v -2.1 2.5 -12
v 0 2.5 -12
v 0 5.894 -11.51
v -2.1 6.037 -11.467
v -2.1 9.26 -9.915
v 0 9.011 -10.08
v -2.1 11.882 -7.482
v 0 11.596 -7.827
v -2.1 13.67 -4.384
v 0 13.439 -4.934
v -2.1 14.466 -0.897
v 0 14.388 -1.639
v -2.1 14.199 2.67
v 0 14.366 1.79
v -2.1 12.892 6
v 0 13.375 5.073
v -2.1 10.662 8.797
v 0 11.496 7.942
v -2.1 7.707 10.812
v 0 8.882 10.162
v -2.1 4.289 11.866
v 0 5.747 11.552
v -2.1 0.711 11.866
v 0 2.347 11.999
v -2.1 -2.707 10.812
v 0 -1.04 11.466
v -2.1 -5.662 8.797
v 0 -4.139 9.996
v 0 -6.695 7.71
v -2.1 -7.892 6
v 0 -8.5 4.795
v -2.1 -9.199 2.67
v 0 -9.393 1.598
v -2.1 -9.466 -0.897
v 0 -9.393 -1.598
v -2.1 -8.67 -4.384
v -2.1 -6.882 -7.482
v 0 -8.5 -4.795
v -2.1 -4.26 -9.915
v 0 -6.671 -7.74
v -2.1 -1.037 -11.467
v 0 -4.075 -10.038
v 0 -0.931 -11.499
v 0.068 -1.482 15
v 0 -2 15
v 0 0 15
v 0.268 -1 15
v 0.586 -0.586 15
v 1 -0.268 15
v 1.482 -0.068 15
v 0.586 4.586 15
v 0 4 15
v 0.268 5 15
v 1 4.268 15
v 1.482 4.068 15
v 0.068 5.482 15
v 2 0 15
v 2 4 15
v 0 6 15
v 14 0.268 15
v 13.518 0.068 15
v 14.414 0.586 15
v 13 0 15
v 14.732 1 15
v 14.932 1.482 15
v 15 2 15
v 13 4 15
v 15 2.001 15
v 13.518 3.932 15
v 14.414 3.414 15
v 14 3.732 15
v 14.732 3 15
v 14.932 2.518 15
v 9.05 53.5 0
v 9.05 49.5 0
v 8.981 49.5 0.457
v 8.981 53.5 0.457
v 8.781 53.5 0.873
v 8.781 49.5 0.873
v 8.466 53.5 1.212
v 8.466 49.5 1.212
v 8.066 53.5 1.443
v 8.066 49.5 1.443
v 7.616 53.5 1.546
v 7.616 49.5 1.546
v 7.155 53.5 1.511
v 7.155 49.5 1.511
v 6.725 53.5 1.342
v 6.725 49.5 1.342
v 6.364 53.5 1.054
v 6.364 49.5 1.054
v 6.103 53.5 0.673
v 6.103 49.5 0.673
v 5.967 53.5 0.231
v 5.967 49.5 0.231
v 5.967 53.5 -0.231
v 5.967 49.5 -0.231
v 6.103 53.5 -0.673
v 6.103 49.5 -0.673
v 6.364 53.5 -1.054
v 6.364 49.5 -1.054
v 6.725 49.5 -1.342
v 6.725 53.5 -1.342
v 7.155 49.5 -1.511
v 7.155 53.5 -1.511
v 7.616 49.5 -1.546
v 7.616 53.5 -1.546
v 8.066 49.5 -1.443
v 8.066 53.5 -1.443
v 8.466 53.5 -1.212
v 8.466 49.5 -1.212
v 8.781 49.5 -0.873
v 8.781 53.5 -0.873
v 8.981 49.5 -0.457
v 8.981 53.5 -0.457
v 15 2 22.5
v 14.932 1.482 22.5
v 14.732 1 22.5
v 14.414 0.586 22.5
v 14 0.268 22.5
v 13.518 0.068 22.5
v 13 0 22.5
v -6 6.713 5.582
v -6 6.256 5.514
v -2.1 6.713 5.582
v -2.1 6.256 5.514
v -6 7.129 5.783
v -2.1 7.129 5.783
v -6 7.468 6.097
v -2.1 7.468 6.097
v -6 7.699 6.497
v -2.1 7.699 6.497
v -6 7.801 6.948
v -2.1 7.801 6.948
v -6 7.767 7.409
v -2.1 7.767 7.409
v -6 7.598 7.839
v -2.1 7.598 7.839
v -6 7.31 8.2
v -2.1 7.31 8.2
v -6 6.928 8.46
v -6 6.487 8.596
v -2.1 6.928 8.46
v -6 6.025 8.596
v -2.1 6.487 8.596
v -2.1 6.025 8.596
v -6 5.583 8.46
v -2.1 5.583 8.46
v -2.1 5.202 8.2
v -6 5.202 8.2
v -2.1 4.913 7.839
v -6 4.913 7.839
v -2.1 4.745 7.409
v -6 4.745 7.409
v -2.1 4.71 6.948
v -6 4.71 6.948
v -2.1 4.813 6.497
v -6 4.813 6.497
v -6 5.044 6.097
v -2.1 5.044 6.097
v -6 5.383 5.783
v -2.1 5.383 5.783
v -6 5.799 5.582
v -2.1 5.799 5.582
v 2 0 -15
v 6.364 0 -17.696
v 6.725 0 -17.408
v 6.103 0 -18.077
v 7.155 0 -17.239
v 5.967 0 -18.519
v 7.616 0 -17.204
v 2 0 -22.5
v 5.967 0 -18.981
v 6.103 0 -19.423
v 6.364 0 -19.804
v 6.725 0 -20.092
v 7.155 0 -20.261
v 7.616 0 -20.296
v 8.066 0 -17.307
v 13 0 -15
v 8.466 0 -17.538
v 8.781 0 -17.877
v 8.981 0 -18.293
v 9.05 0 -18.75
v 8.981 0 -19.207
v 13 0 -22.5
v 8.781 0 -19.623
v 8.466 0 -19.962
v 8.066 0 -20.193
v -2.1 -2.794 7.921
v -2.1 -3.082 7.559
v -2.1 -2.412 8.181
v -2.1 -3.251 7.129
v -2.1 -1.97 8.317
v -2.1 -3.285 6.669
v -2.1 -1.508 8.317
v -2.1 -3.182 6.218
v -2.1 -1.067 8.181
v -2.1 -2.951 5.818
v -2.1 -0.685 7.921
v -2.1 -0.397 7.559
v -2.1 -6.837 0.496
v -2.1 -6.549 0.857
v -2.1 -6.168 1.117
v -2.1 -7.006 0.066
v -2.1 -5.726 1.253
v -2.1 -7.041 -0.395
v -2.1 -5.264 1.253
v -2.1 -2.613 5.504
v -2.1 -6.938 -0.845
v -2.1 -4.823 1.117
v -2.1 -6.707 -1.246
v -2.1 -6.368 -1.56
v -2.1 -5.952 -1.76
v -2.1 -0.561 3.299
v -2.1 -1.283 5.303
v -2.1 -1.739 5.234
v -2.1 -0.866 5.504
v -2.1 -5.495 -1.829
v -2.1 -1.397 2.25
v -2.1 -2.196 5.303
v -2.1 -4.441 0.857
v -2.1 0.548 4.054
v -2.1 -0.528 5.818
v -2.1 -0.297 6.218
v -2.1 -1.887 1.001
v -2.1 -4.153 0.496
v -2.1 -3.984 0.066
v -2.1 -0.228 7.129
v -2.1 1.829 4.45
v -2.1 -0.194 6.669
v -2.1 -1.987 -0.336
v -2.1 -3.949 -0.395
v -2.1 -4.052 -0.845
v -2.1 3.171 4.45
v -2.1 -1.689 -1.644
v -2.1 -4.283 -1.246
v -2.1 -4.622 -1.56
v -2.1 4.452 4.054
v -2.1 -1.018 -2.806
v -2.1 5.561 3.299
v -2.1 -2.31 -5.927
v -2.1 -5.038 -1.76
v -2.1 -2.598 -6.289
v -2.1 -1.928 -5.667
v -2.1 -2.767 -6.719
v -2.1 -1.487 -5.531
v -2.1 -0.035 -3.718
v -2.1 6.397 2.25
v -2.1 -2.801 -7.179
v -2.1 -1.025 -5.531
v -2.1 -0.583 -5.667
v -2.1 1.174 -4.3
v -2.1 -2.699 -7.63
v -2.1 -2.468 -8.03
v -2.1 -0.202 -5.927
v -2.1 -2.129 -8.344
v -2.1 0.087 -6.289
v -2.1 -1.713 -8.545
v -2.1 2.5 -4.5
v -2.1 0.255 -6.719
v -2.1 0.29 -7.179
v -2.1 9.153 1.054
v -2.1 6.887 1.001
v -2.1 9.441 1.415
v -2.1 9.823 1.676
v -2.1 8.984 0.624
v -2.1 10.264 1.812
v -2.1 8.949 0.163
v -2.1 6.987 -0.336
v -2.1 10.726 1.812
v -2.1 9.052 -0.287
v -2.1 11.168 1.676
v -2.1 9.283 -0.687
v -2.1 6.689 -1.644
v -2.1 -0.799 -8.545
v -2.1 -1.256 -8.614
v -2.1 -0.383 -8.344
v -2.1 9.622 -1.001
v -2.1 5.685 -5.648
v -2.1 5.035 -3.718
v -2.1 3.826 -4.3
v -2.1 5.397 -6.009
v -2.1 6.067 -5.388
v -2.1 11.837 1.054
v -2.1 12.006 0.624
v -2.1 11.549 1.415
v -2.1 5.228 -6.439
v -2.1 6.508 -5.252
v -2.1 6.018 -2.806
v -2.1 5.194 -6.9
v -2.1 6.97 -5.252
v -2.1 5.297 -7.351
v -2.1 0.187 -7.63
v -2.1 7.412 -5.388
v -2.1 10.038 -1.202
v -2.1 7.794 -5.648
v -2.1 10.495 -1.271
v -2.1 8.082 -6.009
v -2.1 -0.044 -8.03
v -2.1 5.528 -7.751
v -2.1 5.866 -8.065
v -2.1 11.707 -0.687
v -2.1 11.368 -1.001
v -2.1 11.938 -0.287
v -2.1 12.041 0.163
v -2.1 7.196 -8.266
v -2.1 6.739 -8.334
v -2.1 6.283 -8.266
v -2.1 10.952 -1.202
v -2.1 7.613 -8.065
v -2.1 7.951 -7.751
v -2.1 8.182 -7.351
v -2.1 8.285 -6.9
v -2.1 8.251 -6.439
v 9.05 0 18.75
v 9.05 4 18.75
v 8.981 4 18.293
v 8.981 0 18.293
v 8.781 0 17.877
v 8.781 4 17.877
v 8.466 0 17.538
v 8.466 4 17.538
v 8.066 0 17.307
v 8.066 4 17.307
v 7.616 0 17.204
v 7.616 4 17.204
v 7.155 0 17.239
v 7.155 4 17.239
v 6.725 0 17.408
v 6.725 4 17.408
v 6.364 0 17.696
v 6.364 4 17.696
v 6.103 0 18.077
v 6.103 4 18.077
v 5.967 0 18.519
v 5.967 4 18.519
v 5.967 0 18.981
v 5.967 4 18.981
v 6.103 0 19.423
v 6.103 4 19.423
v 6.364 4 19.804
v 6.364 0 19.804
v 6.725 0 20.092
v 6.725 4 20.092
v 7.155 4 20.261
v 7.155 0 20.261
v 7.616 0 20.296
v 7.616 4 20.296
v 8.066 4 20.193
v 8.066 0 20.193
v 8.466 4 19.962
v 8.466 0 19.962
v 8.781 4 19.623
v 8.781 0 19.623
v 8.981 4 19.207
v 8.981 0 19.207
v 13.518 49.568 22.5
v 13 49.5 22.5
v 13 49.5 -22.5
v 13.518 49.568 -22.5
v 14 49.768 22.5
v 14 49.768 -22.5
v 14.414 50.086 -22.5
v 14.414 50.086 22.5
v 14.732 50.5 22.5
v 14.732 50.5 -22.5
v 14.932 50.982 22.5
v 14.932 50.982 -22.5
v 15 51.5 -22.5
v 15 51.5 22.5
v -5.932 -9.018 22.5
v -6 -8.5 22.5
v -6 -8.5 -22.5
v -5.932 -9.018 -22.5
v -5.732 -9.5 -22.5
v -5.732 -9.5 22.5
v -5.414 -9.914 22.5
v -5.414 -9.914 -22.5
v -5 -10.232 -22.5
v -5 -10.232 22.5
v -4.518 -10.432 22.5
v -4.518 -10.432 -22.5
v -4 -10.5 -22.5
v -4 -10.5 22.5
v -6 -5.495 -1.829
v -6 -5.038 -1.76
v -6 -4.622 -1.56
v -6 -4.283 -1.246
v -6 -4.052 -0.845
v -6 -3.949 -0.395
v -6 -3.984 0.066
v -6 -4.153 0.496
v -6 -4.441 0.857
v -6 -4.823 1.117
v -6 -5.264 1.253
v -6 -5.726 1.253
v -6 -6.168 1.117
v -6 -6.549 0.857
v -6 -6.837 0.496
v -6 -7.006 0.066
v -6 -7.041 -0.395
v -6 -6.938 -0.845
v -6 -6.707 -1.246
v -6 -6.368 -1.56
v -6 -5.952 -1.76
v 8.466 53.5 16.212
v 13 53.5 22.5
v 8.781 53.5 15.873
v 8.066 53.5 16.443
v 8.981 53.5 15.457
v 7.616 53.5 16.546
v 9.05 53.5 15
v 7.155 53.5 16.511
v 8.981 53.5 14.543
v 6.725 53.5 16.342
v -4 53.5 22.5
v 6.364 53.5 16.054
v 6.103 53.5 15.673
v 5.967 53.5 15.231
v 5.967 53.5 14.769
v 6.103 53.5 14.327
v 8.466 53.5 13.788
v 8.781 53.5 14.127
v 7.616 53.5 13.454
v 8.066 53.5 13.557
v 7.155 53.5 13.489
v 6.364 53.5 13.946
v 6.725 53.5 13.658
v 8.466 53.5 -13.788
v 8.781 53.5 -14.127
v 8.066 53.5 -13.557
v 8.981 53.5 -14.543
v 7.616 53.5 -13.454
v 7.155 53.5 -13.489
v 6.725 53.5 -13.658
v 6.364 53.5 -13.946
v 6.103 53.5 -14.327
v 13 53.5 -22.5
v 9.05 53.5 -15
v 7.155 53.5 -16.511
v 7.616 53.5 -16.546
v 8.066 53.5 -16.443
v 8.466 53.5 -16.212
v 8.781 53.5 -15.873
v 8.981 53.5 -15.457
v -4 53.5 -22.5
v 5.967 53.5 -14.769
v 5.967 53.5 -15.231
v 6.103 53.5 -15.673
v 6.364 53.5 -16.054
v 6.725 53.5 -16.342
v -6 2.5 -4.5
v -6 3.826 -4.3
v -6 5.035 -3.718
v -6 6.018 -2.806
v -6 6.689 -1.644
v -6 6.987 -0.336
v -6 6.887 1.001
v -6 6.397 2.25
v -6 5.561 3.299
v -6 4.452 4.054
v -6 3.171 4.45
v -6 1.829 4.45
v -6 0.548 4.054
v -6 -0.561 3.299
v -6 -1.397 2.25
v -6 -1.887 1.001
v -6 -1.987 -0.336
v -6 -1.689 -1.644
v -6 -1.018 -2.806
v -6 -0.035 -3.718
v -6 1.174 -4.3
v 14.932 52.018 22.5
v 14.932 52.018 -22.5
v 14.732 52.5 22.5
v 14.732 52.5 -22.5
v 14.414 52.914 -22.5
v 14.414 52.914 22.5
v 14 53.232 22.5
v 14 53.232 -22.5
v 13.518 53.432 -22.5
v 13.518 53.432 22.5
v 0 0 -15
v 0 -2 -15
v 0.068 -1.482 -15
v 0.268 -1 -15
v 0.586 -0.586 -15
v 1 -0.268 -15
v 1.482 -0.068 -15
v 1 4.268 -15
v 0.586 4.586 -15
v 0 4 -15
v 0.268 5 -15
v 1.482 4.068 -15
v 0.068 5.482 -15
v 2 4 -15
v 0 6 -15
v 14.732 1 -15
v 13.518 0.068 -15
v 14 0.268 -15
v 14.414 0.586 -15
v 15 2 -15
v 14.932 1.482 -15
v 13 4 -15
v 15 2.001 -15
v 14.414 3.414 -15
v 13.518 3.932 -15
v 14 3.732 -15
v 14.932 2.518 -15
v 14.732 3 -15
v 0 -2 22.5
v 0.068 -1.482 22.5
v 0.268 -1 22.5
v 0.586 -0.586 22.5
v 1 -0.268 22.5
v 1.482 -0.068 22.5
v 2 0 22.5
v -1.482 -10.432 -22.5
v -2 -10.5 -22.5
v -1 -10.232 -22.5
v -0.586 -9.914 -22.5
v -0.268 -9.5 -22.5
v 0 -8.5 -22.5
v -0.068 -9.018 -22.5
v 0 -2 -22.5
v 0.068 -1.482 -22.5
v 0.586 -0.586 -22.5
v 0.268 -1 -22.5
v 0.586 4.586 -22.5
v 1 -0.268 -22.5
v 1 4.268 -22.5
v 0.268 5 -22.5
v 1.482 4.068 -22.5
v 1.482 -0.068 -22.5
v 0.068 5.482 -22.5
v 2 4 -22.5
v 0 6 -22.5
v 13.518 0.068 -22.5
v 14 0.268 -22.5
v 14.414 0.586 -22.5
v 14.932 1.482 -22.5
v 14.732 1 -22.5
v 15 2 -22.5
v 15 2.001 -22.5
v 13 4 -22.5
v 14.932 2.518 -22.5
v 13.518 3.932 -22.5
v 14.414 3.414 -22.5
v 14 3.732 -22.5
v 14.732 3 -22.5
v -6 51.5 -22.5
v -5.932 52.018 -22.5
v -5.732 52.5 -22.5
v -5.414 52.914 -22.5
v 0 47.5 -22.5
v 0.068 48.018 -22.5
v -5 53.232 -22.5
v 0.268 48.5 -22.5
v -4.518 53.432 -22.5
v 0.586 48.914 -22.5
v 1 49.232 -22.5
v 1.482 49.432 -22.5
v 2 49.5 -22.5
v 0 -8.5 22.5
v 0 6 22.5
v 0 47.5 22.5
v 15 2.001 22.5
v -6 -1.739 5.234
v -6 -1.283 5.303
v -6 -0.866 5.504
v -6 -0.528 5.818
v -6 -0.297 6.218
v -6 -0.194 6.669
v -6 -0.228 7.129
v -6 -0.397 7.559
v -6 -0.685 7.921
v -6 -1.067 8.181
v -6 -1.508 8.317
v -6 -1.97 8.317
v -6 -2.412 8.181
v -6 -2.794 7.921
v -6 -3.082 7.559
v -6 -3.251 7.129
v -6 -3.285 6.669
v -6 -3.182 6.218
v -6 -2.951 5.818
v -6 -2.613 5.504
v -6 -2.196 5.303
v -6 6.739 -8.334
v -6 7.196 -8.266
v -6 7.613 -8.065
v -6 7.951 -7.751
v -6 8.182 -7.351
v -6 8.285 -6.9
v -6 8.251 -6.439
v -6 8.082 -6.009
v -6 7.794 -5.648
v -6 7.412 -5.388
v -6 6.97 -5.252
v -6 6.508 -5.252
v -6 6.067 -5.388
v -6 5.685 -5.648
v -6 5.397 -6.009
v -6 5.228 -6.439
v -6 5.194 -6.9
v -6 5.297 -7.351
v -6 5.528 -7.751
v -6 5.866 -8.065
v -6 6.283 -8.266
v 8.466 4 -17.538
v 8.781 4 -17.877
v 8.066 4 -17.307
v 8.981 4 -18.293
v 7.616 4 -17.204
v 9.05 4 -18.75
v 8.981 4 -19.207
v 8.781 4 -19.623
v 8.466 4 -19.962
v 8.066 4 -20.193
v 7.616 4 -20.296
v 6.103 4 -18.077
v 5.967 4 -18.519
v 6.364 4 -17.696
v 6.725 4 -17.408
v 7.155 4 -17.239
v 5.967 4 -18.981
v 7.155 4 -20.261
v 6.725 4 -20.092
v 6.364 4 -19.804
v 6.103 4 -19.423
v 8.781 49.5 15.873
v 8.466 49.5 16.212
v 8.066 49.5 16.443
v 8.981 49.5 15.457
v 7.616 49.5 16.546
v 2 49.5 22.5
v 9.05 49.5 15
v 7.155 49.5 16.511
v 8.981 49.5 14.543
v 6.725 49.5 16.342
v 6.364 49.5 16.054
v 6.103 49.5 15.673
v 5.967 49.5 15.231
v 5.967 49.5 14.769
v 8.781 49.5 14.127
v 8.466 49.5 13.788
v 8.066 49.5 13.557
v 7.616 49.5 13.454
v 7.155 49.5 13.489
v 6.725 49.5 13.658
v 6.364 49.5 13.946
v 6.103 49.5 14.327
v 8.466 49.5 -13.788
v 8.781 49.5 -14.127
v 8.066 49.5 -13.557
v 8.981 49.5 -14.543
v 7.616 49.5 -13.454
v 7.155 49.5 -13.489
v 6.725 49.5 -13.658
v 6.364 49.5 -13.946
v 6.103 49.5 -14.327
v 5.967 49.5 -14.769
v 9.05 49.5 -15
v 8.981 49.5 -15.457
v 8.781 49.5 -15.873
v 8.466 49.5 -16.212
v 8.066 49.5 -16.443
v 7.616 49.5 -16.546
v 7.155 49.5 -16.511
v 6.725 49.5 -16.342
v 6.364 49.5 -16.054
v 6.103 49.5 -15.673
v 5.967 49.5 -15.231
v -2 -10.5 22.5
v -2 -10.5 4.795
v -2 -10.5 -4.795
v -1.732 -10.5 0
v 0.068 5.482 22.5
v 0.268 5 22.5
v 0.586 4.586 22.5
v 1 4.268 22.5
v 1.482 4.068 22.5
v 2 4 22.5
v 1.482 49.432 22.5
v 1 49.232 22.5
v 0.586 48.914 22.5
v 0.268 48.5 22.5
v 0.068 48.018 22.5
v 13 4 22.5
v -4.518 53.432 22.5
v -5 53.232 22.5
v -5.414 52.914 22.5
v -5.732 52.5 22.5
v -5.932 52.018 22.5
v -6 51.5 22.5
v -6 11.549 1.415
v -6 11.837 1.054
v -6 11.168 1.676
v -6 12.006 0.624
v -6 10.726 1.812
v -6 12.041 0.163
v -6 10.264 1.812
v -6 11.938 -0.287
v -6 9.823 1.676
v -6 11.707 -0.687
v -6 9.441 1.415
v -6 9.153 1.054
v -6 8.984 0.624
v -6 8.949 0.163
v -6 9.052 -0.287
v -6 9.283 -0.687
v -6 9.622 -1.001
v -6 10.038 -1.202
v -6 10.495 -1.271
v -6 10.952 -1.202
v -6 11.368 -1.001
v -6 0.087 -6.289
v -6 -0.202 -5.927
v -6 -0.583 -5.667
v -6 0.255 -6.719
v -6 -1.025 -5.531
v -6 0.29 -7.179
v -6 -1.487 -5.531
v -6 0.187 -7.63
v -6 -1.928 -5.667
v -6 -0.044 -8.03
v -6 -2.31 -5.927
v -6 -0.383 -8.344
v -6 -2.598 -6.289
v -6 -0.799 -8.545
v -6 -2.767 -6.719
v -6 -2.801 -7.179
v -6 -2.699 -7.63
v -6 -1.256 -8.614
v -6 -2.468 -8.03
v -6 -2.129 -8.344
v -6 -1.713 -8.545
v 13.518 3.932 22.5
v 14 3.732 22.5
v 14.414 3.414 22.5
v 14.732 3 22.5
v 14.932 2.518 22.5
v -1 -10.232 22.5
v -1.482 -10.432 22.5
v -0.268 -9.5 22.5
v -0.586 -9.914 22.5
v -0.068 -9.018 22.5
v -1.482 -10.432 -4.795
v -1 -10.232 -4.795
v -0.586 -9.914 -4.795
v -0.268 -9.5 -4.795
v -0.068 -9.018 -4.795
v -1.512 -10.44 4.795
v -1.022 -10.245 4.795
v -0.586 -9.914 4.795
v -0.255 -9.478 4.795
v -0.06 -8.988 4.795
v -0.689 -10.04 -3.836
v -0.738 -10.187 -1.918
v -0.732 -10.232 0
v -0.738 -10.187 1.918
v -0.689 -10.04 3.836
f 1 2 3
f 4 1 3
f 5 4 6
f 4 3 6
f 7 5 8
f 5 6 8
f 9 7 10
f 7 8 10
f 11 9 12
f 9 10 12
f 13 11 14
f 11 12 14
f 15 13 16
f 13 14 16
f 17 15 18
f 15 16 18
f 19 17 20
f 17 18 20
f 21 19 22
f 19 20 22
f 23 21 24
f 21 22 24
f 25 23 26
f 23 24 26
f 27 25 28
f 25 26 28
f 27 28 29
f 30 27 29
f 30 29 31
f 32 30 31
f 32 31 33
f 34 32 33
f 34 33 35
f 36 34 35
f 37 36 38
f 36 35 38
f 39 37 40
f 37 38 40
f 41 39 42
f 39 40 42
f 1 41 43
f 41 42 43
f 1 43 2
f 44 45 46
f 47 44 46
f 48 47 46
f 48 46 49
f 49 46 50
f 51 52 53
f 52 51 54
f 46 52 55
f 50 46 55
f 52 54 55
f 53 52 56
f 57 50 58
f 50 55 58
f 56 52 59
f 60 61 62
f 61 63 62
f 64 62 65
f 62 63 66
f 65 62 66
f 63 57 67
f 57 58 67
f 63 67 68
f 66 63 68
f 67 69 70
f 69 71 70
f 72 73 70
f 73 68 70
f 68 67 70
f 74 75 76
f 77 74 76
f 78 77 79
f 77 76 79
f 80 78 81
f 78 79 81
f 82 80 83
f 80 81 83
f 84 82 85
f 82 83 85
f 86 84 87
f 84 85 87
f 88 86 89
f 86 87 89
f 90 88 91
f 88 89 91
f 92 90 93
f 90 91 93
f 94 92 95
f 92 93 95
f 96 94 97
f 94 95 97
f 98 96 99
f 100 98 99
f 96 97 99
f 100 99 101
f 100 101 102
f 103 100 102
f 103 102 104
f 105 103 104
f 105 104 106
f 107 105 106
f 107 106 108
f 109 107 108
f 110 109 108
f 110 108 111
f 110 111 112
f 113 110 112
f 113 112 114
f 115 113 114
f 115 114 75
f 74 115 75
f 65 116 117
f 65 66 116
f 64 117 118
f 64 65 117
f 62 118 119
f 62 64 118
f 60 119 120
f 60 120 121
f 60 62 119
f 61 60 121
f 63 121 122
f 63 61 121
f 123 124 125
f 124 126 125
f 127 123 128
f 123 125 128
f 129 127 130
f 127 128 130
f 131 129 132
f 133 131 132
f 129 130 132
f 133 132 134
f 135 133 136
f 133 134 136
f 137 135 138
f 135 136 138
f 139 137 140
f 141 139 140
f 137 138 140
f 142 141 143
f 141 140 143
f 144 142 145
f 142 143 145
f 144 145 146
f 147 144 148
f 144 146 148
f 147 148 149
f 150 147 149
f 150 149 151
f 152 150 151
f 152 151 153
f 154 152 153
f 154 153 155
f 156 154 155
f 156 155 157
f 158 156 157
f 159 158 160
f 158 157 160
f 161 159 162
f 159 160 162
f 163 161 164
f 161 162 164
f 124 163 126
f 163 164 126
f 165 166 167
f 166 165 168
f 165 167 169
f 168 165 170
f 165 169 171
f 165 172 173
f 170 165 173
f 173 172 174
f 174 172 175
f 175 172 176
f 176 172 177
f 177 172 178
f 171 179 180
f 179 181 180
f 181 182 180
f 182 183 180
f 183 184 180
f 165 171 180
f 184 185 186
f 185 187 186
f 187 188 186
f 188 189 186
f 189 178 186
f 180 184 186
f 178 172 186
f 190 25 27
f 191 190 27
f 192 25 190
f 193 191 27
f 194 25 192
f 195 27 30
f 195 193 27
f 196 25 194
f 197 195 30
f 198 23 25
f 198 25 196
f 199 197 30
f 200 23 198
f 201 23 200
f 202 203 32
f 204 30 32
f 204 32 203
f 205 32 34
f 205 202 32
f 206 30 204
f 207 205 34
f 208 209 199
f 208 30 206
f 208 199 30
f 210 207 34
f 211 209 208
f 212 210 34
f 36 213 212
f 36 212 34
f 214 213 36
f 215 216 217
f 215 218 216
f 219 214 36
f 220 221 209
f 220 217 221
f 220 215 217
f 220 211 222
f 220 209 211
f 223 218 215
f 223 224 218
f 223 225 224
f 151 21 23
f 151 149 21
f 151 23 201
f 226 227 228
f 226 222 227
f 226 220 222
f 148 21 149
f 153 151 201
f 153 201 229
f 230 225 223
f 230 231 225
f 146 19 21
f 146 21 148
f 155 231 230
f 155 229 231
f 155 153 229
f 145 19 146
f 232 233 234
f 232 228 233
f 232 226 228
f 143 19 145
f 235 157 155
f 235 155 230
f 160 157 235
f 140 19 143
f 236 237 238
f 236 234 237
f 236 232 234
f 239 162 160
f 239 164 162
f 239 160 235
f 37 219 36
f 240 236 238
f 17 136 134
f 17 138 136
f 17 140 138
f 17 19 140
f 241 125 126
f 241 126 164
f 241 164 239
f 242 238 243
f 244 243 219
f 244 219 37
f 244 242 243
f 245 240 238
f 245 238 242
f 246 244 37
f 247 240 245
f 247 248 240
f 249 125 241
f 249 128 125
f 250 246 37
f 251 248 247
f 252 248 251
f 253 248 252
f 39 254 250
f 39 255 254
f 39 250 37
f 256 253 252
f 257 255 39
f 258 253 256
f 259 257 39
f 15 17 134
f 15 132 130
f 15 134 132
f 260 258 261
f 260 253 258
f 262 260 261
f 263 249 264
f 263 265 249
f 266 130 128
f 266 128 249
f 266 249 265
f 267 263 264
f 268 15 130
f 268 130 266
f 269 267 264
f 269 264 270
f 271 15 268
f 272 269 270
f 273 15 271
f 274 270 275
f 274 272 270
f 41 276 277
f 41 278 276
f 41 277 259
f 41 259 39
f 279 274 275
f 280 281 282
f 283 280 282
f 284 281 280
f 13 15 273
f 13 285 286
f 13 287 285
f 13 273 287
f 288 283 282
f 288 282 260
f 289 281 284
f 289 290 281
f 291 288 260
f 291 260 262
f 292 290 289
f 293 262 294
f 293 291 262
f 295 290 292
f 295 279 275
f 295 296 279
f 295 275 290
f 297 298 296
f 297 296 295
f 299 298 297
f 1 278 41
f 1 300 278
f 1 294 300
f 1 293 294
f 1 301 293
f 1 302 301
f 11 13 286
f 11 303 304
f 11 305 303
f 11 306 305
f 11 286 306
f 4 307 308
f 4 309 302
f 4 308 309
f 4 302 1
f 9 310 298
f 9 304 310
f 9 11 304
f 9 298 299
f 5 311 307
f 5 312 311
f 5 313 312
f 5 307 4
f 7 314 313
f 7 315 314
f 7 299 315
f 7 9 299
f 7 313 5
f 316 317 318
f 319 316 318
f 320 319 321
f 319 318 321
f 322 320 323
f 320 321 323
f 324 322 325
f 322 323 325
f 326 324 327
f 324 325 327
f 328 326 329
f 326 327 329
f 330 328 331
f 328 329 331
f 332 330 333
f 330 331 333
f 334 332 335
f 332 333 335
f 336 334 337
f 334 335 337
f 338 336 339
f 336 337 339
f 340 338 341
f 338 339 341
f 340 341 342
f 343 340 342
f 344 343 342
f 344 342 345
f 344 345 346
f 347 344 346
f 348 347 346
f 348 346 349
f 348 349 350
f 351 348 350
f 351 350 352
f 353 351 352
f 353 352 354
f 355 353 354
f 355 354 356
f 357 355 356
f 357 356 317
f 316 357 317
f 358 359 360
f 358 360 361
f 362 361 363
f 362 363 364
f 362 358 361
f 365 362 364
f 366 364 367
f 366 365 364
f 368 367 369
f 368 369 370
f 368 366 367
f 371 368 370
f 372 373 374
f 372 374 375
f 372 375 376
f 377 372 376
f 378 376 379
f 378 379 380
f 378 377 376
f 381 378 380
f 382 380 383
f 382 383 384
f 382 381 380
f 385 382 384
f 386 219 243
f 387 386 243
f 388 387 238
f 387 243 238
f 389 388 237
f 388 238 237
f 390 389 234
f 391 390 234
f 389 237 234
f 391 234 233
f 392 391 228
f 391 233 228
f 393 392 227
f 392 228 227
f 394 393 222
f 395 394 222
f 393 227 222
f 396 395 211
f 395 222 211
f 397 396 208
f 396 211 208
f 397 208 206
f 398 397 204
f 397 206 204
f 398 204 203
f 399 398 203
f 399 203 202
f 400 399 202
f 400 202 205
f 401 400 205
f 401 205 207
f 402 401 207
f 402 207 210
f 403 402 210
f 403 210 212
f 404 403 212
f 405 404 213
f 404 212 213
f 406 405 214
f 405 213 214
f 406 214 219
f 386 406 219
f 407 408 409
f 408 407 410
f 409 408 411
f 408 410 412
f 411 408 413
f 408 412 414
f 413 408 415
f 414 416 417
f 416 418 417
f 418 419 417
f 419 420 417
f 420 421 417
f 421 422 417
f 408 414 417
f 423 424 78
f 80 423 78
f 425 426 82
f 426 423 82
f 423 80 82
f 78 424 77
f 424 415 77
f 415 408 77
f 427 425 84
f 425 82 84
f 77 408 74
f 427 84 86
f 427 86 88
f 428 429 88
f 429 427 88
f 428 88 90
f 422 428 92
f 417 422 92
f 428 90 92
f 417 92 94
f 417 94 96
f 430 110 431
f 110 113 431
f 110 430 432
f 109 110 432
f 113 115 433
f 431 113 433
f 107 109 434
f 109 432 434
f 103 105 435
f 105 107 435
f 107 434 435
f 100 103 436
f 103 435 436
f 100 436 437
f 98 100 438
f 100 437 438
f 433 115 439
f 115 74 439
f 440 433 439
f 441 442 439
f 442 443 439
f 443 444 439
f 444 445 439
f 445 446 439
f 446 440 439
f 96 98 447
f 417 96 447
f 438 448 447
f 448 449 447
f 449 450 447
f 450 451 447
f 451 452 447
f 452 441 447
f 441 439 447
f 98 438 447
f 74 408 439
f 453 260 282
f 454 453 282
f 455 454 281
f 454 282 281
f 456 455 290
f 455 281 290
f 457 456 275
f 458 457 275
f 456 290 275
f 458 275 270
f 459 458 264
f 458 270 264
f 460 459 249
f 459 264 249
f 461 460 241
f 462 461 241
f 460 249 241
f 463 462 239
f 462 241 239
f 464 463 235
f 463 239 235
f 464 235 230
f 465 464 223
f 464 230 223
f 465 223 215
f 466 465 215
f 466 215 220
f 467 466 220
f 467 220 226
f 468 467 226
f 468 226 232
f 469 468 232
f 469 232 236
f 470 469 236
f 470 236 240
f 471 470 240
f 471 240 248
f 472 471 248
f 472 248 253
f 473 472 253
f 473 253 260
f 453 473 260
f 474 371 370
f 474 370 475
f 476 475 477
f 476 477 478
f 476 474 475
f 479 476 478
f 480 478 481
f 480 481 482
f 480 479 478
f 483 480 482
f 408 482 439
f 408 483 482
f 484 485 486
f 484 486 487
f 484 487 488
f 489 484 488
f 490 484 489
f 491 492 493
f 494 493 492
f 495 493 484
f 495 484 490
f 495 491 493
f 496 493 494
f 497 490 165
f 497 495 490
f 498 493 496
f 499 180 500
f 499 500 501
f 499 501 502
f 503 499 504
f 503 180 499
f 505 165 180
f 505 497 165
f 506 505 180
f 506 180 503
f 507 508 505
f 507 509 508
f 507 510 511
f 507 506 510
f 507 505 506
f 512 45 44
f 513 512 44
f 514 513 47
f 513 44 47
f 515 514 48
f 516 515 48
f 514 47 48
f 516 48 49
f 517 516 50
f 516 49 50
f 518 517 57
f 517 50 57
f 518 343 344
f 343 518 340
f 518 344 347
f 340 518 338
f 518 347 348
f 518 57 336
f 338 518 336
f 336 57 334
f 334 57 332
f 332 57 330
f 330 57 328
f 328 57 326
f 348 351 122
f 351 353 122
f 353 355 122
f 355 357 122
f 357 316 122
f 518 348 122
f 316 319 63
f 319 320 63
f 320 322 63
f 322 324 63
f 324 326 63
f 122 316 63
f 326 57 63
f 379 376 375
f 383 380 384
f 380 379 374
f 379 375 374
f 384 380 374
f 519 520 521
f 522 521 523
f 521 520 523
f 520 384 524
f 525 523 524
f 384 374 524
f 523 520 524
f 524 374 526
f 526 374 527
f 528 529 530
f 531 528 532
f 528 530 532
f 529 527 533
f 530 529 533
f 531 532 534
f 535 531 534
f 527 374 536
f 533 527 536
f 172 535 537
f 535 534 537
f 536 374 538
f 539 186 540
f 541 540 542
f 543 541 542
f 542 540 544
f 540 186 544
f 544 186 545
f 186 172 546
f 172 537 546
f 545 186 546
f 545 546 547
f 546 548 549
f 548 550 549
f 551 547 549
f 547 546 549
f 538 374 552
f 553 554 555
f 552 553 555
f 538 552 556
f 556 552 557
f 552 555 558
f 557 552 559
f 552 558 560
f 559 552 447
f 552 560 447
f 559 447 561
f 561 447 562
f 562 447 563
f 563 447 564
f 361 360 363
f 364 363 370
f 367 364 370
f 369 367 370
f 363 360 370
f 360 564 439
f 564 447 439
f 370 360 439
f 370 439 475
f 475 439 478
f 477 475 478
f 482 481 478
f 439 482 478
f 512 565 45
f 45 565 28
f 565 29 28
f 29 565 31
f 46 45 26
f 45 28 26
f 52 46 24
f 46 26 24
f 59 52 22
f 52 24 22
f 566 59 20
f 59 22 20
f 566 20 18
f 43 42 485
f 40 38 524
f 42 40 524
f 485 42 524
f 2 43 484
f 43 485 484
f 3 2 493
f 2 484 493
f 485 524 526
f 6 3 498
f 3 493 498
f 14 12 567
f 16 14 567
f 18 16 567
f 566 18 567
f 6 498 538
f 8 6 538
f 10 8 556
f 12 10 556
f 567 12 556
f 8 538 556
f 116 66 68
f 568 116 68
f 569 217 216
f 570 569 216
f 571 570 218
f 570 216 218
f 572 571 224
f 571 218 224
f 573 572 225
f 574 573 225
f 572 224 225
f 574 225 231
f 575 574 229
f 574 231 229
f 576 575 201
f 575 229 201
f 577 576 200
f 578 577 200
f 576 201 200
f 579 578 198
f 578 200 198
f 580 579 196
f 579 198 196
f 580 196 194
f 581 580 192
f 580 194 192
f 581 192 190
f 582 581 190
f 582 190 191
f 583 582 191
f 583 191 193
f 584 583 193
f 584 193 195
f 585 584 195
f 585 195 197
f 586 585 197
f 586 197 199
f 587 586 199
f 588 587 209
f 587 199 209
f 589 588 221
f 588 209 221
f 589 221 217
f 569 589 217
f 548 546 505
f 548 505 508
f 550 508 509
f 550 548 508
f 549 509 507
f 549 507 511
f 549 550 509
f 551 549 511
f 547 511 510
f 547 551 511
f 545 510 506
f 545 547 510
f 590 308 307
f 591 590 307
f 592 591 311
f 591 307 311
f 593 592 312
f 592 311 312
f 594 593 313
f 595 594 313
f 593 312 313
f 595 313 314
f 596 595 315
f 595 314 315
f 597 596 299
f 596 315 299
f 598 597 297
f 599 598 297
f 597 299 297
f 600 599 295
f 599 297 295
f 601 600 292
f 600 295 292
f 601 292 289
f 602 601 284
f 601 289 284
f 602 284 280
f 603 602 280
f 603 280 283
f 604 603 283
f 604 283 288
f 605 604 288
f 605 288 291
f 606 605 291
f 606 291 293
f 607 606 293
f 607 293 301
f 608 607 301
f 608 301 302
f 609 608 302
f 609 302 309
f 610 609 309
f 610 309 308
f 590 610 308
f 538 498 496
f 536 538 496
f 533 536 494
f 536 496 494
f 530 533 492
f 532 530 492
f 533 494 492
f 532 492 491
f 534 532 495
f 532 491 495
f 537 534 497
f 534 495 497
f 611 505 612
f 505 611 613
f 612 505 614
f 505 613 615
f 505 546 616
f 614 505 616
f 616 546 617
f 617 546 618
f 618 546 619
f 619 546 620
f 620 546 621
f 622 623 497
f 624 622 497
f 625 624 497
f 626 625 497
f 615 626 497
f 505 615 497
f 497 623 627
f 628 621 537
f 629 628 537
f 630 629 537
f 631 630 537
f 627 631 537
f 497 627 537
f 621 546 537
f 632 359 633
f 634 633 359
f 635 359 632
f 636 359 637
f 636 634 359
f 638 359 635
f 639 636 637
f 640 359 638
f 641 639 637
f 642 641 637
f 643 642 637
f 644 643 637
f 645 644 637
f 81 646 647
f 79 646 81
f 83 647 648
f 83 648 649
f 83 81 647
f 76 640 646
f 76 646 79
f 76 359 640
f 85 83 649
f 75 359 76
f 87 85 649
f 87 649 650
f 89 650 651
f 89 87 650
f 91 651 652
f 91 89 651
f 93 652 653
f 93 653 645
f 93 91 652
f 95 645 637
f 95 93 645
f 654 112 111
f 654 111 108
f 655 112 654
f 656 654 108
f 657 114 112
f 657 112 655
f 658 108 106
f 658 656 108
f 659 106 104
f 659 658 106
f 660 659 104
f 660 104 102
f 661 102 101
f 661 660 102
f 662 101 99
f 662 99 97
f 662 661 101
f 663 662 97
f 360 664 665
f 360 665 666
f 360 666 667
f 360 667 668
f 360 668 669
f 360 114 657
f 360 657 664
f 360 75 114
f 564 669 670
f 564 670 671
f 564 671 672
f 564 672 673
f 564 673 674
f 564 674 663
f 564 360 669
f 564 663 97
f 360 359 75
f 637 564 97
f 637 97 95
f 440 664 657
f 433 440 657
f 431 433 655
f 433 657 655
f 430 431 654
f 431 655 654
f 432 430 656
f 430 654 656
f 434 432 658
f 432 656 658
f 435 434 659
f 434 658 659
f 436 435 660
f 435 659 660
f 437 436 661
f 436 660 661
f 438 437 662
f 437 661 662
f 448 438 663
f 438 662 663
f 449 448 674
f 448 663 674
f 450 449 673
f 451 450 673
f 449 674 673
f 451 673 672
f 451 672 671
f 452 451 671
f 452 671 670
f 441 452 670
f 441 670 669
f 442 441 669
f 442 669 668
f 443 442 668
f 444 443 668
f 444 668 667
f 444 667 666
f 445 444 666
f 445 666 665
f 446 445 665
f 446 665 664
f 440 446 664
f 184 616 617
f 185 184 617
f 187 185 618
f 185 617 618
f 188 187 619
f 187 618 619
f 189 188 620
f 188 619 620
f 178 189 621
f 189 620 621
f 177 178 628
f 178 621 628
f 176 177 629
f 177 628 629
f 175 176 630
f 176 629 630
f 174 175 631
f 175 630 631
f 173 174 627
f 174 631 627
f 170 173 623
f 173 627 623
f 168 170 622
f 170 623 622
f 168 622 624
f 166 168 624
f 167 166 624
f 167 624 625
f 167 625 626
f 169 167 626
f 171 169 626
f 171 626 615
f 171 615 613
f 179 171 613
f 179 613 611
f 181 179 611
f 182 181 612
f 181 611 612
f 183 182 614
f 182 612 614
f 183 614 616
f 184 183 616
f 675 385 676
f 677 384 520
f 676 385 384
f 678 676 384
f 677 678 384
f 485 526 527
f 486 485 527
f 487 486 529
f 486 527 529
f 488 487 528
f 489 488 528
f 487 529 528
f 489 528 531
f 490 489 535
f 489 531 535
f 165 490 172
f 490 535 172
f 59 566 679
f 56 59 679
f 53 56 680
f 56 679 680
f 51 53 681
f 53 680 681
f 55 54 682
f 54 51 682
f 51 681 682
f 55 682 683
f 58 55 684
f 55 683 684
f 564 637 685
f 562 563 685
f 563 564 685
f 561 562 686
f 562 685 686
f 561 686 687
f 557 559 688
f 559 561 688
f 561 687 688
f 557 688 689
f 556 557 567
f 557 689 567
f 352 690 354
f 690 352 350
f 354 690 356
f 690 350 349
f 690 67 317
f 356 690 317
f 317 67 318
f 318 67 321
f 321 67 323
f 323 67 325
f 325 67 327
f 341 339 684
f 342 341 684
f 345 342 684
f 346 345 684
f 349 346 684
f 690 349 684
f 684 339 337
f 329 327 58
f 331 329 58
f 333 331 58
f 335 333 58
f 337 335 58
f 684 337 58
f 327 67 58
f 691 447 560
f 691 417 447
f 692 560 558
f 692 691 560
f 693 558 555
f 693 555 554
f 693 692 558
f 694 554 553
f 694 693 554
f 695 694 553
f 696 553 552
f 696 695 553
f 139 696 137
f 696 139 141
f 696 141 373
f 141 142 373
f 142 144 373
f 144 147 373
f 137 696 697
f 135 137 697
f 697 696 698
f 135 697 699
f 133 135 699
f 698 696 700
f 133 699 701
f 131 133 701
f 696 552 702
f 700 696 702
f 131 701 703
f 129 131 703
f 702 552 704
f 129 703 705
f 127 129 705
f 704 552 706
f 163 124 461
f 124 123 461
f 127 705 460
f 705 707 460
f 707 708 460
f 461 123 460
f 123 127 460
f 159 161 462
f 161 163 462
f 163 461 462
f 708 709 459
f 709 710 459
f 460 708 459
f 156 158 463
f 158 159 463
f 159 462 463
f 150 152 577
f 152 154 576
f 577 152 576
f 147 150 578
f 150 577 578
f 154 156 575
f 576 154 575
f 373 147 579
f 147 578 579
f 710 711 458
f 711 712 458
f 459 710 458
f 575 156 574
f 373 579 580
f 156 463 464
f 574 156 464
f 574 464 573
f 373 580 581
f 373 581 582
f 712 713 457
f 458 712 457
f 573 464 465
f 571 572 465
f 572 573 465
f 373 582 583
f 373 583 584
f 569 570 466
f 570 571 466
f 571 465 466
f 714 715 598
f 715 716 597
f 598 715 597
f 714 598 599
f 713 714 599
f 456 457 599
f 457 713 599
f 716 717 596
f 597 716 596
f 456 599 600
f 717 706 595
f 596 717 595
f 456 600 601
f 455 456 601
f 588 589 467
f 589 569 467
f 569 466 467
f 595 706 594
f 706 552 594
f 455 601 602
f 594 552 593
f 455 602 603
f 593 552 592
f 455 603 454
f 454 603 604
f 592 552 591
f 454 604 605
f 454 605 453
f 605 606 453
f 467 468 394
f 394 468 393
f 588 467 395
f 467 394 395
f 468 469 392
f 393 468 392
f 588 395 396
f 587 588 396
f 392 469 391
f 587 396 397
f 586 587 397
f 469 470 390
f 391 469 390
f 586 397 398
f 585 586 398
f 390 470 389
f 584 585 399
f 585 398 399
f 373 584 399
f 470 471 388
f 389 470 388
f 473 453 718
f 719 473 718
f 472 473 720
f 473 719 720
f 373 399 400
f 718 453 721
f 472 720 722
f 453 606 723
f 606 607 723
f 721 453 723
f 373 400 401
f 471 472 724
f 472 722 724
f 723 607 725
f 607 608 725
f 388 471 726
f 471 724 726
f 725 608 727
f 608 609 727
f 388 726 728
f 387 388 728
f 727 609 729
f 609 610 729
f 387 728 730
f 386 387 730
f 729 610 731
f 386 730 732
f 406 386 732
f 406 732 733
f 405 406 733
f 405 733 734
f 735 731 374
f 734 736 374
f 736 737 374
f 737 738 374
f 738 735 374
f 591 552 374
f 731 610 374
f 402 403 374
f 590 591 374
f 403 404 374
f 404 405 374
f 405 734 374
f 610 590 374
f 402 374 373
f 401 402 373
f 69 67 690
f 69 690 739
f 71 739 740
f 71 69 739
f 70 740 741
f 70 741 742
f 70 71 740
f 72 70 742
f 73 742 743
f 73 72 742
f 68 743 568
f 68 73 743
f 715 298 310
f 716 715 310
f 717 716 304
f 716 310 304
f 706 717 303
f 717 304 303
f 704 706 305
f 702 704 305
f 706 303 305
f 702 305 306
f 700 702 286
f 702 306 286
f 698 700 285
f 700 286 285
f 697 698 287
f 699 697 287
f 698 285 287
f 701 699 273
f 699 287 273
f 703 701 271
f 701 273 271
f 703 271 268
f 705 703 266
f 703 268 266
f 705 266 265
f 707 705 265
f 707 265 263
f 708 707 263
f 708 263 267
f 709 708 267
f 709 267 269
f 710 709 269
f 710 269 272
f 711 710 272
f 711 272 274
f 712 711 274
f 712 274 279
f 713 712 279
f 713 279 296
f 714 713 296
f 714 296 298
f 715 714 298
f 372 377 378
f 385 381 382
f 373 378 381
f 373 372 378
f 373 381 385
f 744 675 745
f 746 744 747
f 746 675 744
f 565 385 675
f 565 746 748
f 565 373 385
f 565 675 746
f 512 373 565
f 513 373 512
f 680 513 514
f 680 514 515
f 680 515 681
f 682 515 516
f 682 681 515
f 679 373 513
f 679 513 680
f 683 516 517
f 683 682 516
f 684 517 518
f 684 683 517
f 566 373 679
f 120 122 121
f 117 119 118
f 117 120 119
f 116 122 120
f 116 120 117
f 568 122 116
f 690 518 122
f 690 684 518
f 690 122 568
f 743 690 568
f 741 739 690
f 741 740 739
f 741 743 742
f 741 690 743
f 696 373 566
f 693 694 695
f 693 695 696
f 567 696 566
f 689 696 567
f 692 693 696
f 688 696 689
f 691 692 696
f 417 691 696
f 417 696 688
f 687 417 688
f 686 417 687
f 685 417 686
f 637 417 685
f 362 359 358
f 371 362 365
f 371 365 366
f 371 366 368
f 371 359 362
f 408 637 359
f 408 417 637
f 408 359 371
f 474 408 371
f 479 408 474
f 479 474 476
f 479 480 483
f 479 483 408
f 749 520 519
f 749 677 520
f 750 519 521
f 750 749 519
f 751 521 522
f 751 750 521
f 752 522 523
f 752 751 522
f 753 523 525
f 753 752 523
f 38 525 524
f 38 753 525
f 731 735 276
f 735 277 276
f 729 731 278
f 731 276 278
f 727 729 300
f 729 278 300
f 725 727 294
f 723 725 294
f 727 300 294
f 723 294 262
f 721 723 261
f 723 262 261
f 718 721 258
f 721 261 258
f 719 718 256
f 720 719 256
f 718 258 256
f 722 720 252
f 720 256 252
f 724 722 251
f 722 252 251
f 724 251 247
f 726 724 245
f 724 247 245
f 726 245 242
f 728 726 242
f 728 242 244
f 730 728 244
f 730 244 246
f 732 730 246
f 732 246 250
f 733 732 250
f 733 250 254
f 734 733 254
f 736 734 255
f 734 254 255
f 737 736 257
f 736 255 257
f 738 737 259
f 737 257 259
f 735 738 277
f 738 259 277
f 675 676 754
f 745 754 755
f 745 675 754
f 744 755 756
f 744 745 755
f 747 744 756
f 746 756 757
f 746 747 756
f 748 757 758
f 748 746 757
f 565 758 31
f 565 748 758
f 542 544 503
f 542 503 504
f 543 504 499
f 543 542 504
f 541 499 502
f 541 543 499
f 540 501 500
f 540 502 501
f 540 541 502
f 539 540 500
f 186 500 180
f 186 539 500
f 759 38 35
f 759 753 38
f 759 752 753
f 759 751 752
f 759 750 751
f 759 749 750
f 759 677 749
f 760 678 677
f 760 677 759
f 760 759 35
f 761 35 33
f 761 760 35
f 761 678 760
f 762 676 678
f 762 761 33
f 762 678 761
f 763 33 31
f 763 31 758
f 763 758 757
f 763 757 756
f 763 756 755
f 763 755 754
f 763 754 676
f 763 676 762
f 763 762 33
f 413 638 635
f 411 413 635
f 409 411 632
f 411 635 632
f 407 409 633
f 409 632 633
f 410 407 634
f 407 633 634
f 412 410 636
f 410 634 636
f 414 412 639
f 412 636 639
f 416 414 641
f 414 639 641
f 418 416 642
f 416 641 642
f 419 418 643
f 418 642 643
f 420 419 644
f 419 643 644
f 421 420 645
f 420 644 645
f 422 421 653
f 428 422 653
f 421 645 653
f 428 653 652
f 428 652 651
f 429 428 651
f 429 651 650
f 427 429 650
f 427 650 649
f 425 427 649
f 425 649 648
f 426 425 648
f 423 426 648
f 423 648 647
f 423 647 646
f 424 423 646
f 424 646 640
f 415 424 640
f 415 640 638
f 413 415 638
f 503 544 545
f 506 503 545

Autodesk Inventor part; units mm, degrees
ref_plane "YZ Plane" through (0, 0, 0) normal (1, 0, 0) x (0, 1, 0)
ref_plane "XZ Plane" through (0, 0, 0) normal (0, 1, 0) x (-1, 0, 0)
ref_plane "XY Plane" through (0, 0, 0) normal (0, 0, 1) x (1, 0, 0)
sketch "Sketch1" plane through (0, 0, 0) normal (0, 0, 1) x (1, 0, 0)
  line L0 (0, 0) -> (15, 0)
  line L1 (15, 0) -> (15, 4)
  line L2 (15, 4) -> (0, 4)
  line L3 (0, 4) -> (0, 0)
  line L4 (0, 53.5) -> (15, 53.5)
  line L5 (15, 53.5) -> (15, 49.5)
  line L6 (15, 49.5) -> (0, 49.5)
  line L7 (0, 49.5) -> (0, 53.5)
  line L8 (0, 53.5) -> (-6, 53.5)
  line L9 (-6, 53.5) -> (-6, -10.5)
  line L10 (-6, -10.5) -> (0, -10.5)
  line L11 (0, -10.5) -> (0, 53.5)
  point P0 (0, 49.5)
  dimension "d0" = 15
  dimension "d1" = 4
  dimension "d2" = 15
  dimension "d3" = 4
  dimension "d4" = 45.5
  dimension "d5" = 6
  dimension "d6" = 64
extrude "Extrusion1" add sketch "Sketch1" along normal mid plane 45
extrude "Extrusion2" cut sketch "Sketch1" along normal mid plane 30 contours L3 L2 L1 L0
sketch "Sketch3" plane through (0, 49.5, 22.5) normal (0, -1, 0) x (1, 0, 0)
  line L0 (0, 0) -> (15, 0) projected
  line L1 (7.5, 0) -> (7.5, -45)
  line L2 (15, -45) -> (0, -45) projected
  circle A0 centre (7.5, -3.75) radius 1.55
  circle A1 centre (7.5, -7.5) radius 1.55
  circle A2 centre (7.5, -22.5) radius 1.55
  circle A3 centre (7.5, -37.5) radius 1.55
  circle A4 centre (7.5, -41.25) radius 1.55
  line L3 (0, 0) -> (15, 0) projected
  line L4 (15, -45) -> (0, -45) projected
  line L5 (15, -45) -> (15, 0) projected
  point P0 (0, -22.5)
  dimension "d11" = 3.1
  dimension "d12" = 3.1
  dimension "d13" = 3.1
  dimension "d14" = 3.1
  dimension "d15" = 3.1
  dimension "d16" = 3.75
  dimension "d17" = 7.5
  dimension "d18" = 3.75
  dimension "d19" = 7.5
  dimension "d20" = 7.5
extrude "Extrusion3" cut sketch "Sketch3" along normal through all contours A0 L1 | L1 A0 | A4 L1 | L1 A4
extrude "Extrusion4" cut sketch "Sketch3" against normal through all contours A1 L1 | L1 A1 | A2 L1 | L1 A2 | A3 L1 | L1 A3
sketch "Sketch4" plane through (0, 4, -22.5) normal (1, 0, 0) x (0, 0, -1)
  circle A0 centre (-22.5, -1.5) radius 8 construction
  line L0 (-22.7792, 6.4951) -> (-22.2208, -9.4951) construction
  circle A1 centre (-22.7792, 6.4951) radius 1.55
  circle A2 centre (-22.5, -1.5) radius 4.5
  circle A3 centre (-22.5, -1.5) radius 12
  circle A4 centre (-29.5636, 2.2558) radius 1.55
  circle A5 centre (-29.2844, -5.7394) radius 1.55
  circle A6 centre (-22.2208, -9.4951) radius 1.55
  circle A7 centre (-15.4364, -5.2558) radius 1.55
  circle A8 centre (-15.7156, 2.7394) radius 1.55
  line L1 (-45, -14.5) -> (0, -14.5) projected
  line L2 (-22.5, -1.5) -> (-22.5, -14.5) construction
  point P0 (-22.5, -4)
  dimension "d25" = 16
  dimension "d26" = 3.1
  dimension "d29" = 9
  dimension "d30" = 24
  dimension "d33" = 360
  dimension "d43" = 13
  dimension "d44" = 2
extrude "Extrusion5" cut sketch "Sketch4" against normal blind 2.1
extrude "Extrusion6" cut sketch "Sketch4" against normal through all contours A1 | A2 | A4 | A5 | A6 | A7 | A8
fillet "Fillet1" radius 2 14 edges at (0, 49.5, 0) (15, 49.5, 0) (15, 53.5, 0) (-6, 53.5, 0) (0, 4, 18.75) (0, 4, -18.75) (15, 4, -18.75) (15, 0, -18.75) (15, 4, 18.75) (15, 0, 18.75) (0, -10.5, 0) (0, 0, 18.75) (0, 0, -18.75) (-6, -10.5, 0)
properties part number "MotorBracket" material "PC/ABS Plastic"
